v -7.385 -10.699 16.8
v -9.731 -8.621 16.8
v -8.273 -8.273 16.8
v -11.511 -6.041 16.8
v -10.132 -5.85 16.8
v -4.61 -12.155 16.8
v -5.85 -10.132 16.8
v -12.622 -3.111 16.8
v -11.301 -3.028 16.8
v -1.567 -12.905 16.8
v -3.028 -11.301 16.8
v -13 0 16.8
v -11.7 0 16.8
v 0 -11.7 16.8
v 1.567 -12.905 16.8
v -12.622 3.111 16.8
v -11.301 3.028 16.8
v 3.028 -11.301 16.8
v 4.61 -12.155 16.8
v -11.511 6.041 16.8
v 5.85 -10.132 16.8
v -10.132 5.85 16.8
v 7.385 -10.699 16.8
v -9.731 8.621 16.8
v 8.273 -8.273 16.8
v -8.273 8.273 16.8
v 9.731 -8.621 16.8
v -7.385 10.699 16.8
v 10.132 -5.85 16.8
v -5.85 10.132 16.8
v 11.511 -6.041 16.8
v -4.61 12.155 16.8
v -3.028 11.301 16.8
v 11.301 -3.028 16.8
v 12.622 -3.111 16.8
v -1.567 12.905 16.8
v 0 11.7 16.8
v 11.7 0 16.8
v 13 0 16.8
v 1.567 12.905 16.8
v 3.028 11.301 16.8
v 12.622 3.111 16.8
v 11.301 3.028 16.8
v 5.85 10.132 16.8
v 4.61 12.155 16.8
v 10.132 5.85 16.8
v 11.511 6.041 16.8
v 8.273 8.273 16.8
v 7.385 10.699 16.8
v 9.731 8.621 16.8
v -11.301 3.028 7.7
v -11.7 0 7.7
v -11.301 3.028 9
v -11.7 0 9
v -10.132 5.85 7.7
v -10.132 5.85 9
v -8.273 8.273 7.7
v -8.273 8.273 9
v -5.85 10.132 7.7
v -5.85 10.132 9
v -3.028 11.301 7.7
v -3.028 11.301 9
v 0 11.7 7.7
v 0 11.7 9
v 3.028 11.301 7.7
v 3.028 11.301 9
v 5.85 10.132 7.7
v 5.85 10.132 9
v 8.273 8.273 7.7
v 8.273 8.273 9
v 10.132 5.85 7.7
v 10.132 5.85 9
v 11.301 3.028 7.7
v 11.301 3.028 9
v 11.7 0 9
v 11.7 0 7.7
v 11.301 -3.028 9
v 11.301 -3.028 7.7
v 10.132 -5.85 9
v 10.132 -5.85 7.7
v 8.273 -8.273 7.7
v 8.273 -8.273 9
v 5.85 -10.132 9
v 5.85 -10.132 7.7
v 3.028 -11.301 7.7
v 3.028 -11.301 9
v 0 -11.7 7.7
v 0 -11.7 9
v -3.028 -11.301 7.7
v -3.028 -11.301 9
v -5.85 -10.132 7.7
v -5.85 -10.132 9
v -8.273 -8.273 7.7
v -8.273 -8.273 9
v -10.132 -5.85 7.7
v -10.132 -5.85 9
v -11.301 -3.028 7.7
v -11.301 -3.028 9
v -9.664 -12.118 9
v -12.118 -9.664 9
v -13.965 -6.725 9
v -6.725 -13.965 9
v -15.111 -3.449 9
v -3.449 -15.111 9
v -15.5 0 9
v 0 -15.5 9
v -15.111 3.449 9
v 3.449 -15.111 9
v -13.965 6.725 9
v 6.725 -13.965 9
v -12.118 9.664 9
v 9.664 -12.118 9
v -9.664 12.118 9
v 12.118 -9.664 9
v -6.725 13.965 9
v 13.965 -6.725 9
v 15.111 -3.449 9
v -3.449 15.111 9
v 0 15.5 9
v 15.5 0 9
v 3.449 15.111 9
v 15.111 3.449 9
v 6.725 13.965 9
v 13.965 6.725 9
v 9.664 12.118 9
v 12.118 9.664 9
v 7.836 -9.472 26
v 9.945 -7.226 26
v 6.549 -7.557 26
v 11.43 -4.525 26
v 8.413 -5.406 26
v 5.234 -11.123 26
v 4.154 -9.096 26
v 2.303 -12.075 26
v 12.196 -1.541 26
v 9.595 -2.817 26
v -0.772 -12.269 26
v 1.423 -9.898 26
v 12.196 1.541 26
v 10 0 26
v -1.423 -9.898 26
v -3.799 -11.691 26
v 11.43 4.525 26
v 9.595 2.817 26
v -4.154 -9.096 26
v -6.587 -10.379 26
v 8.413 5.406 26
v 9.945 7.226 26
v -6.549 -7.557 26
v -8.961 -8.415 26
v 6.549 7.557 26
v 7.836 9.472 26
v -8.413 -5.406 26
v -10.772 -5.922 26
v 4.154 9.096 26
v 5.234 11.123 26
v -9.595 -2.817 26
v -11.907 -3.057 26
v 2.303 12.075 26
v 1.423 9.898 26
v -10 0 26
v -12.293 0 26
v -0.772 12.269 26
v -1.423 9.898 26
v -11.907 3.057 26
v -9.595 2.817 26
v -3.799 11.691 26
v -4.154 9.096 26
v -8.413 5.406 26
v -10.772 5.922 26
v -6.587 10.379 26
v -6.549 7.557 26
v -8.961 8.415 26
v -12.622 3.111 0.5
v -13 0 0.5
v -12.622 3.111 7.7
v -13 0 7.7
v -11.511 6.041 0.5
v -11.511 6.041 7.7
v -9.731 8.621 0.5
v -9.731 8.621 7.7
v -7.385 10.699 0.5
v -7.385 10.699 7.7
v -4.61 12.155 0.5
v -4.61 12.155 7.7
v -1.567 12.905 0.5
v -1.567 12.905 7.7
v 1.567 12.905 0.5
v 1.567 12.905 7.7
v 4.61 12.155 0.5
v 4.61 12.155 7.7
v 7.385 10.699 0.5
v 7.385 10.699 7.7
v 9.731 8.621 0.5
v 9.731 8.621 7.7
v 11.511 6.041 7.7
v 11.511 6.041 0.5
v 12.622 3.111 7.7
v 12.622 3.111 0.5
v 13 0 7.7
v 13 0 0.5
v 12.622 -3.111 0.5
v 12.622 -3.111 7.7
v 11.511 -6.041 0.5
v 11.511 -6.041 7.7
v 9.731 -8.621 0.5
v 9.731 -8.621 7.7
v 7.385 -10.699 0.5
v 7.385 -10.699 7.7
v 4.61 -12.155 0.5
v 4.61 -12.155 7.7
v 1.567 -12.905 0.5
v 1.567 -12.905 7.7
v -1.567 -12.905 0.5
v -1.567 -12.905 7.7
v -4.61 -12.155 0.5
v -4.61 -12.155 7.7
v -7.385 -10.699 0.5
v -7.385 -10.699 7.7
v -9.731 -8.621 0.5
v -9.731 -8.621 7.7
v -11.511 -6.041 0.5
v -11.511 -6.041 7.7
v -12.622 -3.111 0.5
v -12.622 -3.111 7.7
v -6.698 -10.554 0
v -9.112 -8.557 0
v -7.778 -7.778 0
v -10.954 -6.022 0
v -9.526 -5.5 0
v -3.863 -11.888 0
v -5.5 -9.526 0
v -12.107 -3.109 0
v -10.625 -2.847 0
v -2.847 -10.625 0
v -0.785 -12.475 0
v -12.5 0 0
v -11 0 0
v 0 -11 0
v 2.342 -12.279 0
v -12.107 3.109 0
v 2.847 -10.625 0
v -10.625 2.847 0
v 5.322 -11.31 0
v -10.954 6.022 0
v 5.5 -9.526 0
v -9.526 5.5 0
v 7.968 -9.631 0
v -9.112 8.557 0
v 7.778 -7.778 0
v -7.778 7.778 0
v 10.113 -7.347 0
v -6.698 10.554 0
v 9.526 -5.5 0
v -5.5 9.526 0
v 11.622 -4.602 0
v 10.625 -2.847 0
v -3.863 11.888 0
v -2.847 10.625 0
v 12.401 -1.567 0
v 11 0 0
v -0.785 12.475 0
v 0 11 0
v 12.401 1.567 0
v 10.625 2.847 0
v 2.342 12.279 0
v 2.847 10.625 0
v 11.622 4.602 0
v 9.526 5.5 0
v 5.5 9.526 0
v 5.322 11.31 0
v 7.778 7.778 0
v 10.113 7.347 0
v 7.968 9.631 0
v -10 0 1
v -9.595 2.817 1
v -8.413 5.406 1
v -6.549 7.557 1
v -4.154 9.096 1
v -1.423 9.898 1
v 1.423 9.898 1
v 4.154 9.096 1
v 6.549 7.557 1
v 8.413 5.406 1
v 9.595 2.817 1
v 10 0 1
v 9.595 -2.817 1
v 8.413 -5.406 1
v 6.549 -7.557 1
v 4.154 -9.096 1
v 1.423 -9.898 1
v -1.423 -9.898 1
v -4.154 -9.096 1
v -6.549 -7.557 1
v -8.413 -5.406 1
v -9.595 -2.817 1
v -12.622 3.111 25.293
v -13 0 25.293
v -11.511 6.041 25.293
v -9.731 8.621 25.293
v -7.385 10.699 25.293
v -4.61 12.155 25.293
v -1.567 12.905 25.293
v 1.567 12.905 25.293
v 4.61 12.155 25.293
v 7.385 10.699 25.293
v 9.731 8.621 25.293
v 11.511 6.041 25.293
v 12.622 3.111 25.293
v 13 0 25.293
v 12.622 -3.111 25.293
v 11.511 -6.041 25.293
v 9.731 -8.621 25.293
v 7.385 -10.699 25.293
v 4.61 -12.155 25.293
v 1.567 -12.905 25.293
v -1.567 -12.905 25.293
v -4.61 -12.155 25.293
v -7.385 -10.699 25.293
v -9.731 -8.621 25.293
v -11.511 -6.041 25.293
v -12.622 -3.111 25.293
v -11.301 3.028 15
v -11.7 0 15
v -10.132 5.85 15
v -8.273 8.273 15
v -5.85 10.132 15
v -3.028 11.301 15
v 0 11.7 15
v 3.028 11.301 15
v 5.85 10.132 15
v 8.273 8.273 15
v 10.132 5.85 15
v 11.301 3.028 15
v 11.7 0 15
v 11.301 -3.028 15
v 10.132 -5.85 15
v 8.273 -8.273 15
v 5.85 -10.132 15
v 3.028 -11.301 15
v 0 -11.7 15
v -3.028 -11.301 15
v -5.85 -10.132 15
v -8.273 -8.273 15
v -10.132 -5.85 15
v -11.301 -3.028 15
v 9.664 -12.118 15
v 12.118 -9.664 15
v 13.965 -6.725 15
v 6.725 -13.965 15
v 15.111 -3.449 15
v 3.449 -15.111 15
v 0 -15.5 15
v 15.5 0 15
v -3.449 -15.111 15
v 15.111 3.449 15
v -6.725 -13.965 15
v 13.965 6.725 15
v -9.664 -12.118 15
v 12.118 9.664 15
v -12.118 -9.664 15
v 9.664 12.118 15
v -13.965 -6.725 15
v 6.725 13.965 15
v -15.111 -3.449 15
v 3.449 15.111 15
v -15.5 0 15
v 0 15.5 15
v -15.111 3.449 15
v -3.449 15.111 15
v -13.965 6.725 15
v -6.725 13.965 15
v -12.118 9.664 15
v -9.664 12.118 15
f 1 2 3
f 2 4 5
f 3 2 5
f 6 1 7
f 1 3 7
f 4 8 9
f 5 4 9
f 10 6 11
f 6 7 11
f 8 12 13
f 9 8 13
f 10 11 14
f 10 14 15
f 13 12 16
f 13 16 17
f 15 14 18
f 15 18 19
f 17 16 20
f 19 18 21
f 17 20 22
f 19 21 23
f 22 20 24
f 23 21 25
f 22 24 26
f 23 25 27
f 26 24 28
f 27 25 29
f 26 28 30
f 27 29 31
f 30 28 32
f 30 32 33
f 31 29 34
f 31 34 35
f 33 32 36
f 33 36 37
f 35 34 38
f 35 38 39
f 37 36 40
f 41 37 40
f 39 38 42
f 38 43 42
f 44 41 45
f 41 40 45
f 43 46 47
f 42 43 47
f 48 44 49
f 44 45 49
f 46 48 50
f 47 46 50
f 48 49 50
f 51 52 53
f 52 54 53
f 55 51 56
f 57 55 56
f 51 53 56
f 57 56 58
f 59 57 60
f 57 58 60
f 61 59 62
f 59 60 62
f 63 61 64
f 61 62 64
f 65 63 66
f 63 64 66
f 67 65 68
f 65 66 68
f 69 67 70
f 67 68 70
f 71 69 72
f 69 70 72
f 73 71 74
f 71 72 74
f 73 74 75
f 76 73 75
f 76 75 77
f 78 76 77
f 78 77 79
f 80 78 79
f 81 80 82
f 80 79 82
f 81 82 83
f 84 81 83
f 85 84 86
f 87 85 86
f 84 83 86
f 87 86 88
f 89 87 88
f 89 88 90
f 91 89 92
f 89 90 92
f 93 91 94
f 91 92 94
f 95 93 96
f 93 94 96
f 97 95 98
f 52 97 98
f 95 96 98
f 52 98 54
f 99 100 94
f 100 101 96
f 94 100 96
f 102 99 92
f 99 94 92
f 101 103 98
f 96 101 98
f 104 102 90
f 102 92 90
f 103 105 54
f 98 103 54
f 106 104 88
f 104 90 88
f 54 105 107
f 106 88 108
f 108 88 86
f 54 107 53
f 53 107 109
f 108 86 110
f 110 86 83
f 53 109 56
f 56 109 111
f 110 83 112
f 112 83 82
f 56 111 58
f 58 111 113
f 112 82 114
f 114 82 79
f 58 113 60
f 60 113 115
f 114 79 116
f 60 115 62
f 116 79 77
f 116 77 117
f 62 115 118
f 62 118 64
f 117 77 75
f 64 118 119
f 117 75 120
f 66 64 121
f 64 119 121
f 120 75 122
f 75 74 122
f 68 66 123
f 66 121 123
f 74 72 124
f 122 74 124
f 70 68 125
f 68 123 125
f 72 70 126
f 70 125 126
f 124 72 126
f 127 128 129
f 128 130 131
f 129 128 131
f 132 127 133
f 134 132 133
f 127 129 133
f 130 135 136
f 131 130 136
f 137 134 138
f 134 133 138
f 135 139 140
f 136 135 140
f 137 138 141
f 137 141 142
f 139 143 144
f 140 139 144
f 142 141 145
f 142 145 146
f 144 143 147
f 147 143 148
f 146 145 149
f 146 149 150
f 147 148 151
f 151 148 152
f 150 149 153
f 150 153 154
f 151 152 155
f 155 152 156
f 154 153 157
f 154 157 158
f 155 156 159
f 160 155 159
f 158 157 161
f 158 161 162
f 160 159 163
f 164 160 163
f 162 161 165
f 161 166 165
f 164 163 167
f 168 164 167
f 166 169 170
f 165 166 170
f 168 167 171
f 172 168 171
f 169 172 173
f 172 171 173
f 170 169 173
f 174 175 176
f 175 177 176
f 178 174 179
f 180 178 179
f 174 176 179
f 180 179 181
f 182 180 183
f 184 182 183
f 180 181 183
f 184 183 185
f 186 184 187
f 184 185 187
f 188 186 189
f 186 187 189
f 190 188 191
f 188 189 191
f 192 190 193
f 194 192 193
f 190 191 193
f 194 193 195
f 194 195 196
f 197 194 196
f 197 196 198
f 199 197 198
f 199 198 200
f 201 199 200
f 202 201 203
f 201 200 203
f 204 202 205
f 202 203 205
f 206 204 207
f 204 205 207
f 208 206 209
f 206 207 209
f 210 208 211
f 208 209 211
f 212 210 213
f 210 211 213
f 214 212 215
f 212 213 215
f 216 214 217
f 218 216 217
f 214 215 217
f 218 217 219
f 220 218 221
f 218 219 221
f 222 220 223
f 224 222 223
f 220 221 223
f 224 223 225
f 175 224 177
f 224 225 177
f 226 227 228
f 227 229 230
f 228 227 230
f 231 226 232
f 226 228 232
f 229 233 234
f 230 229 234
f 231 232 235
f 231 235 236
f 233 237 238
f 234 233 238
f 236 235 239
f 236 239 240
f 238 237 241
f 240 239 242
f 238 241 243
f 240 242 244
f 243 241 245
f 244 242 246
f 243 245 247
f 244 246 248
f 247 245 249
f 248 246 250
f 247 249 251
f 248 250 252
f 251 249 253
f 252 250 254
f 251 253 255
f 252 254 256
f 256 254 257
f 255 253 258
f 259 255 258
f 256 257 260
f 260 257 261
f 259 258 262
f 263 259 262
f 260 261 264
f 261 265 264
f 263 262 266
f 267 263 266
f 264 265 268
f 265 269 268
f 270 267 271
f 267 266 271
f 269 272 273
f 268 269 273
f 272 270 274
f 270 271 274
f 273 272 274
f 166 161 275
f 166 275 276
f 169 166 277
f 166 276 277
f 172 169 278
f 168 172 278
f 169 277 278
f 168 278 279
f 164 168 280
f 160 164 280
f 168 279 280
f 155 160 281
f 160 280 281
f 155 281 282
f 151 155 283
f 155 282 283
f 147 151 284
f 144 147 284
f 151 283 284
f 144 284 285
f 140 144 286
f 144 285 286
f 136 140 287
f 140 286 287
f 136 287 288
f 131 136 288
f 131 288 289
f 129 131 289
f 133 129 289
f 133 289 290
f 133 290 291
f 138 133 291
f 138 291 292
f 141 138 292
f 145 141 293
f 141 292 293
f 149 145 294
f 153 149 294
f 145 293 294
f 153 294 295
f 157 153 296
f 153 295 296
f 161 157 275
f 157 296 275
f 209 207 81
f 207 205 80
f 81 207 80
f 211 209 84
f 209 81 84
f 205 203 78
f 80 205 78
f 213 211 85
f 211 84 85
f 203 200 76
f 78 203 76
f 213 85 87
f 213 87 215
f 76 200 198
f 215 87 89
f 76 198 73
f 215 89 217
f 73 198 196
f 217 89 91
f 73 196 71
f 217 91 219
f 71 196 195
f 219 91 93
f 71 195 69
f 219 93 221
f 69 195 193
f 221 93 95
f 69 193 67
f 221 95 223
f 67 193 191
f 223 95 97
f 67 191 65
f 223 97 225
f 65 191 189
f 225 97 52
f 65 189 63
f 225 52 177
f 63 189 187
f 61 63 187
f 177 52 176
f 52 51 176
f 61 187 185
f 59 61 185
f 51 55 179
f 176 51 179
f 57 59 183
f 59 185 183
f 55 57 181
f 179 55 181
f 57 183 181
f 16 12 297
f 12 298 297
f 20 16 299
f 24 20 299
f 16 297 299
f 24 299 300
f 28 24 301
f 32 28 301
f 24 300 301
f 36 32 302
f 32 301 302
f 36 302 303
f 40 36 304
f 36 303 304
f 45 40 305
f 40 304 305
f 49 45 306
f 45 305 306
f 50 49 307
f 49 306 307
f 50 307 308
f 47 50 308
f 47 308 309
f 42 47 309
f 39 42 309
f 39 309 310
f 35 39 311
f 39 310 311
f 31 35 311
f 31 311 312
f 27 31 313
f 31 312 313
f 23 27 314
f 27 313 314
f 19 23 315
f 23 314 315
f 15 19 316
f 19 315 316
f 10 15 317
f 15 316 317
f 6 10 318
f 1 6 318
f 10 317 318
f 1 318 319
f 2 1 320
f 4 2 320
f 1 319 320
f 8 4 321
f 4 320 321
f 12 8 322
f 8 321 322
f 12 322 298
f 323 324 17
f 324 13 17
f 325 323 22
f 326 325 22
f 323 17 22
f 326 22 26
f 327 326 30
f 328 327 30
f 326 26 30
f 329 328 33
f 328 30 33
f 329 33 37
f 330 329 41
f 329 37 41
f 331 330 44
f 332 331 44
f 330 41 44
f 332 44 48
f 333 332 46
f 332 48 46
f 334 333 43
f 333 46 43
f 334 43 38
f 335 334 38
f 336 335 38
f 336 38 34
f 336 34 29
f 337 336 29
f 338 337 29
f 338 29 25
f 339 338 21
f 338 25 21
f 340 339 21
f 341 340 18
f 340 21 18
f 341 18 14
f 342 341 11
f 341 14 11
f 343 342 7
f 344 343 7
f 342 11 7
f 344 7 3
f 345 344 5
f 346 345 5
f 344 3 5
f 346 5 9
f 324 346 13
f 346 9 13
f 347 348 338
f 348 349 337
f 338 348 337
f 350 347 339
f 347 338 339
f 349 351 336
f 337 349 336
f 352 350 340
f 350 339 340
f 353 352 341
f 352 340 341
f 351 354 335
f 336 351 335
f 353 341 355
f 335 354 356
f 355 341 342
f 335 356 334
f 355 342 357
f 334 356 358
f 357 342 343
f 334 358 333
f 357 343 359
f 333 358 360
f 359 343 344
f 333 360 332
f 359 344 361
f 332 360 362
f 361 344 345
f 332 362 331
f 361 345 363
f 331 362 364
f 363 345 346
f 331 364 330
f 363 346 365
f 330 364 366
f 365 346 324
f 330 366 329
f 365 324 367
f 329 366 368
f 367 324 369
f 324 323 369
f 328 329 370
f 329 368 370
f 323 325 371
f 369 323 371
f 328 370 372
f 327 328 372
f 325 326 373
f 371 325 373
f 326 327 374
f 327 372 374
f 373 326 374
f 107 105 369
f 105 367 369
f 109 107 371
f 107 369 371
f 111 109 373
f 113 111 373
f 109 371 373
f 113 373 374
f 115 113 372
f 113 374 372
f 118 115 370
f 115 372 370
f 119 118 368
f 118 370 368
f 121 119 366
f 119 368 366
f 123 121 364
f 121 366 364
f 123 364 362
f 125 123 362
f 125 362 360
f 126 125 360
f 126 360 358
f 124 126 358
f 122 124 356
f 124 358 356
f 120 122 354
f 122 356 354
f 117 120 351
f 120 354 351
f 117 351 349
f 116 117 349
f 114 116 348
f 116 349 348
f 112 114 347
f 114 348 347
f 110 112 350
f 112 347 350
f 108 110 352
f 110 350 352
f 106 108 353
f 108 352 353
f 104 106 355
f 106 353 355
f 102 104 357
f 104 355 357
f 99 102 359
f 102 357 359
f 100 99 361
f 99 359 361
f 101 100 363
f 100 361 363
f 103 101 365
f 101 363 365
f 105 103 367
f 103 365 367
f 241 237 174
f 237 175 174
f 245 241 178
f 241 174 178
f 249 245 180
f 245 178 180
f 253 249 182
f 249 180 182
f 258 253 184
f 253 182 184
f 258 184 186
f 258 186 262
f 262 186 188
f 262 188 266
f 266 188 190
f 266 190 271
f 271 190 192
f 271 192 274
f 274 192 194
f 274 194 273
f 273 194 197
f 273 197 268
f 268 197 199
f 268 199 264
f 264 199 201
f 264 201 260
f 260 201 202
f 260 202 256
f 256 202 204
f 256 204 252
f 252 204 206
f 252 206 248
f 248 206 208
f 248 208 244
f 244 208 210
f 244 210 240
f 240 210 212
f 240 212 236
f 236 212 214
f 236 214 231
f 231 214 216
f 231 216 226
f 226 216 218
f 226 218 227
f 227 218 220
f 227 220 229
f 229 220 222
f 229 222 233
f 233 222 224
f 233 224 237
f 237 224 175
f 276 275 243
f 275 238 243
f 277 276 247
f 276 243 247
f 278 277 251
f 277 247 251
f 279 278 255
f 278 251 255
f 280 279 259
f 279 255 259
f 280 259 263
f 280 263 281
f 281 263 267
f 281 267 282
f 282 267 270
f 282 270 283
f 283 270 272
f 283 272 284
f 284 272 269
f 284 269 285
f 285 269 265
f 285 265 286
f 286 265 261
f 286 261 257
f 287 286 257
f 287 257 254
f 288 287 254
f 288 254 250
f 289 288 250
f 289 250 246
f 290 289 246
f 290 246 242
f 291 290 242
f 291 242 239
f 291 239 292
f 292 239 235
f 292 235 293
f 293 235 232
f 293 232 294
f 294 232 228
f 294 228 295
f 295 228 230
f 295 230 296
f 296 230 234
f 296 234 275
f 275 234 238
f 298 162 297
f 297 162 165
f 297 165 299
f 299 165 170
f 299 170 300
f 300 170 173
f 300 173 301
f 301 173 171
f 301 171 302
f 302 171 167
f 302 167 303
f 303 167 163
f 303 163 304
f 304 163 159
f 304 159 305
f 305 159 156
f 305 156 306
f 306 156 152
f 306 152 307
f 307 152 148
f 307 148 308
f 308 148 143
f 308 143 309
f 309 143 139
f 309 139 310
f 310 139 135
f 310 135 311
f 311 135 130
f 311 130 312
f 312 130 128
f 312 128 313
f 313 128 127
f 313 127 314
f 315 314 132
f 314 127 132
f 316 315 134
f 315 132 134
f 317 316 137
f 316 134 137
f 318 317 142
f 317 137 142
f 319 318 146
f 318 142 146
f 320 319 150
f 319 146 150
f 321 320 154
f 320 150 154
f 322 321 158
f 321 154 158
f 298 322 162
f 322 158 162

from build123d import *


with BuildPart() as part:
    # Эскиз1 → Повернуть1 (revolve)
    with BuildSketch(Plane.XZ, mode=Mode.PRIVATE) as revolve_1_sk:
        Polygon((11.7, 16.8), (13, 16.8), (13, 25.292893219), (12.292893219, 26), (10, 26), (10, 1), (11, 0), (12.5, 0), (13, 0.5), (13, 7.7), (11.7, 7.7), (11.7, 9), (15.5, 9), (15.5, 15), (11.7, 15), align=None)
    revolve(revolve_1_sk.sketch.rotate(Axis((0, 0, 26.005), (0, 0, -1)), 180), axis=Axis((0, 0, 26.005), (0, 0, -1)))


solid = part.part
